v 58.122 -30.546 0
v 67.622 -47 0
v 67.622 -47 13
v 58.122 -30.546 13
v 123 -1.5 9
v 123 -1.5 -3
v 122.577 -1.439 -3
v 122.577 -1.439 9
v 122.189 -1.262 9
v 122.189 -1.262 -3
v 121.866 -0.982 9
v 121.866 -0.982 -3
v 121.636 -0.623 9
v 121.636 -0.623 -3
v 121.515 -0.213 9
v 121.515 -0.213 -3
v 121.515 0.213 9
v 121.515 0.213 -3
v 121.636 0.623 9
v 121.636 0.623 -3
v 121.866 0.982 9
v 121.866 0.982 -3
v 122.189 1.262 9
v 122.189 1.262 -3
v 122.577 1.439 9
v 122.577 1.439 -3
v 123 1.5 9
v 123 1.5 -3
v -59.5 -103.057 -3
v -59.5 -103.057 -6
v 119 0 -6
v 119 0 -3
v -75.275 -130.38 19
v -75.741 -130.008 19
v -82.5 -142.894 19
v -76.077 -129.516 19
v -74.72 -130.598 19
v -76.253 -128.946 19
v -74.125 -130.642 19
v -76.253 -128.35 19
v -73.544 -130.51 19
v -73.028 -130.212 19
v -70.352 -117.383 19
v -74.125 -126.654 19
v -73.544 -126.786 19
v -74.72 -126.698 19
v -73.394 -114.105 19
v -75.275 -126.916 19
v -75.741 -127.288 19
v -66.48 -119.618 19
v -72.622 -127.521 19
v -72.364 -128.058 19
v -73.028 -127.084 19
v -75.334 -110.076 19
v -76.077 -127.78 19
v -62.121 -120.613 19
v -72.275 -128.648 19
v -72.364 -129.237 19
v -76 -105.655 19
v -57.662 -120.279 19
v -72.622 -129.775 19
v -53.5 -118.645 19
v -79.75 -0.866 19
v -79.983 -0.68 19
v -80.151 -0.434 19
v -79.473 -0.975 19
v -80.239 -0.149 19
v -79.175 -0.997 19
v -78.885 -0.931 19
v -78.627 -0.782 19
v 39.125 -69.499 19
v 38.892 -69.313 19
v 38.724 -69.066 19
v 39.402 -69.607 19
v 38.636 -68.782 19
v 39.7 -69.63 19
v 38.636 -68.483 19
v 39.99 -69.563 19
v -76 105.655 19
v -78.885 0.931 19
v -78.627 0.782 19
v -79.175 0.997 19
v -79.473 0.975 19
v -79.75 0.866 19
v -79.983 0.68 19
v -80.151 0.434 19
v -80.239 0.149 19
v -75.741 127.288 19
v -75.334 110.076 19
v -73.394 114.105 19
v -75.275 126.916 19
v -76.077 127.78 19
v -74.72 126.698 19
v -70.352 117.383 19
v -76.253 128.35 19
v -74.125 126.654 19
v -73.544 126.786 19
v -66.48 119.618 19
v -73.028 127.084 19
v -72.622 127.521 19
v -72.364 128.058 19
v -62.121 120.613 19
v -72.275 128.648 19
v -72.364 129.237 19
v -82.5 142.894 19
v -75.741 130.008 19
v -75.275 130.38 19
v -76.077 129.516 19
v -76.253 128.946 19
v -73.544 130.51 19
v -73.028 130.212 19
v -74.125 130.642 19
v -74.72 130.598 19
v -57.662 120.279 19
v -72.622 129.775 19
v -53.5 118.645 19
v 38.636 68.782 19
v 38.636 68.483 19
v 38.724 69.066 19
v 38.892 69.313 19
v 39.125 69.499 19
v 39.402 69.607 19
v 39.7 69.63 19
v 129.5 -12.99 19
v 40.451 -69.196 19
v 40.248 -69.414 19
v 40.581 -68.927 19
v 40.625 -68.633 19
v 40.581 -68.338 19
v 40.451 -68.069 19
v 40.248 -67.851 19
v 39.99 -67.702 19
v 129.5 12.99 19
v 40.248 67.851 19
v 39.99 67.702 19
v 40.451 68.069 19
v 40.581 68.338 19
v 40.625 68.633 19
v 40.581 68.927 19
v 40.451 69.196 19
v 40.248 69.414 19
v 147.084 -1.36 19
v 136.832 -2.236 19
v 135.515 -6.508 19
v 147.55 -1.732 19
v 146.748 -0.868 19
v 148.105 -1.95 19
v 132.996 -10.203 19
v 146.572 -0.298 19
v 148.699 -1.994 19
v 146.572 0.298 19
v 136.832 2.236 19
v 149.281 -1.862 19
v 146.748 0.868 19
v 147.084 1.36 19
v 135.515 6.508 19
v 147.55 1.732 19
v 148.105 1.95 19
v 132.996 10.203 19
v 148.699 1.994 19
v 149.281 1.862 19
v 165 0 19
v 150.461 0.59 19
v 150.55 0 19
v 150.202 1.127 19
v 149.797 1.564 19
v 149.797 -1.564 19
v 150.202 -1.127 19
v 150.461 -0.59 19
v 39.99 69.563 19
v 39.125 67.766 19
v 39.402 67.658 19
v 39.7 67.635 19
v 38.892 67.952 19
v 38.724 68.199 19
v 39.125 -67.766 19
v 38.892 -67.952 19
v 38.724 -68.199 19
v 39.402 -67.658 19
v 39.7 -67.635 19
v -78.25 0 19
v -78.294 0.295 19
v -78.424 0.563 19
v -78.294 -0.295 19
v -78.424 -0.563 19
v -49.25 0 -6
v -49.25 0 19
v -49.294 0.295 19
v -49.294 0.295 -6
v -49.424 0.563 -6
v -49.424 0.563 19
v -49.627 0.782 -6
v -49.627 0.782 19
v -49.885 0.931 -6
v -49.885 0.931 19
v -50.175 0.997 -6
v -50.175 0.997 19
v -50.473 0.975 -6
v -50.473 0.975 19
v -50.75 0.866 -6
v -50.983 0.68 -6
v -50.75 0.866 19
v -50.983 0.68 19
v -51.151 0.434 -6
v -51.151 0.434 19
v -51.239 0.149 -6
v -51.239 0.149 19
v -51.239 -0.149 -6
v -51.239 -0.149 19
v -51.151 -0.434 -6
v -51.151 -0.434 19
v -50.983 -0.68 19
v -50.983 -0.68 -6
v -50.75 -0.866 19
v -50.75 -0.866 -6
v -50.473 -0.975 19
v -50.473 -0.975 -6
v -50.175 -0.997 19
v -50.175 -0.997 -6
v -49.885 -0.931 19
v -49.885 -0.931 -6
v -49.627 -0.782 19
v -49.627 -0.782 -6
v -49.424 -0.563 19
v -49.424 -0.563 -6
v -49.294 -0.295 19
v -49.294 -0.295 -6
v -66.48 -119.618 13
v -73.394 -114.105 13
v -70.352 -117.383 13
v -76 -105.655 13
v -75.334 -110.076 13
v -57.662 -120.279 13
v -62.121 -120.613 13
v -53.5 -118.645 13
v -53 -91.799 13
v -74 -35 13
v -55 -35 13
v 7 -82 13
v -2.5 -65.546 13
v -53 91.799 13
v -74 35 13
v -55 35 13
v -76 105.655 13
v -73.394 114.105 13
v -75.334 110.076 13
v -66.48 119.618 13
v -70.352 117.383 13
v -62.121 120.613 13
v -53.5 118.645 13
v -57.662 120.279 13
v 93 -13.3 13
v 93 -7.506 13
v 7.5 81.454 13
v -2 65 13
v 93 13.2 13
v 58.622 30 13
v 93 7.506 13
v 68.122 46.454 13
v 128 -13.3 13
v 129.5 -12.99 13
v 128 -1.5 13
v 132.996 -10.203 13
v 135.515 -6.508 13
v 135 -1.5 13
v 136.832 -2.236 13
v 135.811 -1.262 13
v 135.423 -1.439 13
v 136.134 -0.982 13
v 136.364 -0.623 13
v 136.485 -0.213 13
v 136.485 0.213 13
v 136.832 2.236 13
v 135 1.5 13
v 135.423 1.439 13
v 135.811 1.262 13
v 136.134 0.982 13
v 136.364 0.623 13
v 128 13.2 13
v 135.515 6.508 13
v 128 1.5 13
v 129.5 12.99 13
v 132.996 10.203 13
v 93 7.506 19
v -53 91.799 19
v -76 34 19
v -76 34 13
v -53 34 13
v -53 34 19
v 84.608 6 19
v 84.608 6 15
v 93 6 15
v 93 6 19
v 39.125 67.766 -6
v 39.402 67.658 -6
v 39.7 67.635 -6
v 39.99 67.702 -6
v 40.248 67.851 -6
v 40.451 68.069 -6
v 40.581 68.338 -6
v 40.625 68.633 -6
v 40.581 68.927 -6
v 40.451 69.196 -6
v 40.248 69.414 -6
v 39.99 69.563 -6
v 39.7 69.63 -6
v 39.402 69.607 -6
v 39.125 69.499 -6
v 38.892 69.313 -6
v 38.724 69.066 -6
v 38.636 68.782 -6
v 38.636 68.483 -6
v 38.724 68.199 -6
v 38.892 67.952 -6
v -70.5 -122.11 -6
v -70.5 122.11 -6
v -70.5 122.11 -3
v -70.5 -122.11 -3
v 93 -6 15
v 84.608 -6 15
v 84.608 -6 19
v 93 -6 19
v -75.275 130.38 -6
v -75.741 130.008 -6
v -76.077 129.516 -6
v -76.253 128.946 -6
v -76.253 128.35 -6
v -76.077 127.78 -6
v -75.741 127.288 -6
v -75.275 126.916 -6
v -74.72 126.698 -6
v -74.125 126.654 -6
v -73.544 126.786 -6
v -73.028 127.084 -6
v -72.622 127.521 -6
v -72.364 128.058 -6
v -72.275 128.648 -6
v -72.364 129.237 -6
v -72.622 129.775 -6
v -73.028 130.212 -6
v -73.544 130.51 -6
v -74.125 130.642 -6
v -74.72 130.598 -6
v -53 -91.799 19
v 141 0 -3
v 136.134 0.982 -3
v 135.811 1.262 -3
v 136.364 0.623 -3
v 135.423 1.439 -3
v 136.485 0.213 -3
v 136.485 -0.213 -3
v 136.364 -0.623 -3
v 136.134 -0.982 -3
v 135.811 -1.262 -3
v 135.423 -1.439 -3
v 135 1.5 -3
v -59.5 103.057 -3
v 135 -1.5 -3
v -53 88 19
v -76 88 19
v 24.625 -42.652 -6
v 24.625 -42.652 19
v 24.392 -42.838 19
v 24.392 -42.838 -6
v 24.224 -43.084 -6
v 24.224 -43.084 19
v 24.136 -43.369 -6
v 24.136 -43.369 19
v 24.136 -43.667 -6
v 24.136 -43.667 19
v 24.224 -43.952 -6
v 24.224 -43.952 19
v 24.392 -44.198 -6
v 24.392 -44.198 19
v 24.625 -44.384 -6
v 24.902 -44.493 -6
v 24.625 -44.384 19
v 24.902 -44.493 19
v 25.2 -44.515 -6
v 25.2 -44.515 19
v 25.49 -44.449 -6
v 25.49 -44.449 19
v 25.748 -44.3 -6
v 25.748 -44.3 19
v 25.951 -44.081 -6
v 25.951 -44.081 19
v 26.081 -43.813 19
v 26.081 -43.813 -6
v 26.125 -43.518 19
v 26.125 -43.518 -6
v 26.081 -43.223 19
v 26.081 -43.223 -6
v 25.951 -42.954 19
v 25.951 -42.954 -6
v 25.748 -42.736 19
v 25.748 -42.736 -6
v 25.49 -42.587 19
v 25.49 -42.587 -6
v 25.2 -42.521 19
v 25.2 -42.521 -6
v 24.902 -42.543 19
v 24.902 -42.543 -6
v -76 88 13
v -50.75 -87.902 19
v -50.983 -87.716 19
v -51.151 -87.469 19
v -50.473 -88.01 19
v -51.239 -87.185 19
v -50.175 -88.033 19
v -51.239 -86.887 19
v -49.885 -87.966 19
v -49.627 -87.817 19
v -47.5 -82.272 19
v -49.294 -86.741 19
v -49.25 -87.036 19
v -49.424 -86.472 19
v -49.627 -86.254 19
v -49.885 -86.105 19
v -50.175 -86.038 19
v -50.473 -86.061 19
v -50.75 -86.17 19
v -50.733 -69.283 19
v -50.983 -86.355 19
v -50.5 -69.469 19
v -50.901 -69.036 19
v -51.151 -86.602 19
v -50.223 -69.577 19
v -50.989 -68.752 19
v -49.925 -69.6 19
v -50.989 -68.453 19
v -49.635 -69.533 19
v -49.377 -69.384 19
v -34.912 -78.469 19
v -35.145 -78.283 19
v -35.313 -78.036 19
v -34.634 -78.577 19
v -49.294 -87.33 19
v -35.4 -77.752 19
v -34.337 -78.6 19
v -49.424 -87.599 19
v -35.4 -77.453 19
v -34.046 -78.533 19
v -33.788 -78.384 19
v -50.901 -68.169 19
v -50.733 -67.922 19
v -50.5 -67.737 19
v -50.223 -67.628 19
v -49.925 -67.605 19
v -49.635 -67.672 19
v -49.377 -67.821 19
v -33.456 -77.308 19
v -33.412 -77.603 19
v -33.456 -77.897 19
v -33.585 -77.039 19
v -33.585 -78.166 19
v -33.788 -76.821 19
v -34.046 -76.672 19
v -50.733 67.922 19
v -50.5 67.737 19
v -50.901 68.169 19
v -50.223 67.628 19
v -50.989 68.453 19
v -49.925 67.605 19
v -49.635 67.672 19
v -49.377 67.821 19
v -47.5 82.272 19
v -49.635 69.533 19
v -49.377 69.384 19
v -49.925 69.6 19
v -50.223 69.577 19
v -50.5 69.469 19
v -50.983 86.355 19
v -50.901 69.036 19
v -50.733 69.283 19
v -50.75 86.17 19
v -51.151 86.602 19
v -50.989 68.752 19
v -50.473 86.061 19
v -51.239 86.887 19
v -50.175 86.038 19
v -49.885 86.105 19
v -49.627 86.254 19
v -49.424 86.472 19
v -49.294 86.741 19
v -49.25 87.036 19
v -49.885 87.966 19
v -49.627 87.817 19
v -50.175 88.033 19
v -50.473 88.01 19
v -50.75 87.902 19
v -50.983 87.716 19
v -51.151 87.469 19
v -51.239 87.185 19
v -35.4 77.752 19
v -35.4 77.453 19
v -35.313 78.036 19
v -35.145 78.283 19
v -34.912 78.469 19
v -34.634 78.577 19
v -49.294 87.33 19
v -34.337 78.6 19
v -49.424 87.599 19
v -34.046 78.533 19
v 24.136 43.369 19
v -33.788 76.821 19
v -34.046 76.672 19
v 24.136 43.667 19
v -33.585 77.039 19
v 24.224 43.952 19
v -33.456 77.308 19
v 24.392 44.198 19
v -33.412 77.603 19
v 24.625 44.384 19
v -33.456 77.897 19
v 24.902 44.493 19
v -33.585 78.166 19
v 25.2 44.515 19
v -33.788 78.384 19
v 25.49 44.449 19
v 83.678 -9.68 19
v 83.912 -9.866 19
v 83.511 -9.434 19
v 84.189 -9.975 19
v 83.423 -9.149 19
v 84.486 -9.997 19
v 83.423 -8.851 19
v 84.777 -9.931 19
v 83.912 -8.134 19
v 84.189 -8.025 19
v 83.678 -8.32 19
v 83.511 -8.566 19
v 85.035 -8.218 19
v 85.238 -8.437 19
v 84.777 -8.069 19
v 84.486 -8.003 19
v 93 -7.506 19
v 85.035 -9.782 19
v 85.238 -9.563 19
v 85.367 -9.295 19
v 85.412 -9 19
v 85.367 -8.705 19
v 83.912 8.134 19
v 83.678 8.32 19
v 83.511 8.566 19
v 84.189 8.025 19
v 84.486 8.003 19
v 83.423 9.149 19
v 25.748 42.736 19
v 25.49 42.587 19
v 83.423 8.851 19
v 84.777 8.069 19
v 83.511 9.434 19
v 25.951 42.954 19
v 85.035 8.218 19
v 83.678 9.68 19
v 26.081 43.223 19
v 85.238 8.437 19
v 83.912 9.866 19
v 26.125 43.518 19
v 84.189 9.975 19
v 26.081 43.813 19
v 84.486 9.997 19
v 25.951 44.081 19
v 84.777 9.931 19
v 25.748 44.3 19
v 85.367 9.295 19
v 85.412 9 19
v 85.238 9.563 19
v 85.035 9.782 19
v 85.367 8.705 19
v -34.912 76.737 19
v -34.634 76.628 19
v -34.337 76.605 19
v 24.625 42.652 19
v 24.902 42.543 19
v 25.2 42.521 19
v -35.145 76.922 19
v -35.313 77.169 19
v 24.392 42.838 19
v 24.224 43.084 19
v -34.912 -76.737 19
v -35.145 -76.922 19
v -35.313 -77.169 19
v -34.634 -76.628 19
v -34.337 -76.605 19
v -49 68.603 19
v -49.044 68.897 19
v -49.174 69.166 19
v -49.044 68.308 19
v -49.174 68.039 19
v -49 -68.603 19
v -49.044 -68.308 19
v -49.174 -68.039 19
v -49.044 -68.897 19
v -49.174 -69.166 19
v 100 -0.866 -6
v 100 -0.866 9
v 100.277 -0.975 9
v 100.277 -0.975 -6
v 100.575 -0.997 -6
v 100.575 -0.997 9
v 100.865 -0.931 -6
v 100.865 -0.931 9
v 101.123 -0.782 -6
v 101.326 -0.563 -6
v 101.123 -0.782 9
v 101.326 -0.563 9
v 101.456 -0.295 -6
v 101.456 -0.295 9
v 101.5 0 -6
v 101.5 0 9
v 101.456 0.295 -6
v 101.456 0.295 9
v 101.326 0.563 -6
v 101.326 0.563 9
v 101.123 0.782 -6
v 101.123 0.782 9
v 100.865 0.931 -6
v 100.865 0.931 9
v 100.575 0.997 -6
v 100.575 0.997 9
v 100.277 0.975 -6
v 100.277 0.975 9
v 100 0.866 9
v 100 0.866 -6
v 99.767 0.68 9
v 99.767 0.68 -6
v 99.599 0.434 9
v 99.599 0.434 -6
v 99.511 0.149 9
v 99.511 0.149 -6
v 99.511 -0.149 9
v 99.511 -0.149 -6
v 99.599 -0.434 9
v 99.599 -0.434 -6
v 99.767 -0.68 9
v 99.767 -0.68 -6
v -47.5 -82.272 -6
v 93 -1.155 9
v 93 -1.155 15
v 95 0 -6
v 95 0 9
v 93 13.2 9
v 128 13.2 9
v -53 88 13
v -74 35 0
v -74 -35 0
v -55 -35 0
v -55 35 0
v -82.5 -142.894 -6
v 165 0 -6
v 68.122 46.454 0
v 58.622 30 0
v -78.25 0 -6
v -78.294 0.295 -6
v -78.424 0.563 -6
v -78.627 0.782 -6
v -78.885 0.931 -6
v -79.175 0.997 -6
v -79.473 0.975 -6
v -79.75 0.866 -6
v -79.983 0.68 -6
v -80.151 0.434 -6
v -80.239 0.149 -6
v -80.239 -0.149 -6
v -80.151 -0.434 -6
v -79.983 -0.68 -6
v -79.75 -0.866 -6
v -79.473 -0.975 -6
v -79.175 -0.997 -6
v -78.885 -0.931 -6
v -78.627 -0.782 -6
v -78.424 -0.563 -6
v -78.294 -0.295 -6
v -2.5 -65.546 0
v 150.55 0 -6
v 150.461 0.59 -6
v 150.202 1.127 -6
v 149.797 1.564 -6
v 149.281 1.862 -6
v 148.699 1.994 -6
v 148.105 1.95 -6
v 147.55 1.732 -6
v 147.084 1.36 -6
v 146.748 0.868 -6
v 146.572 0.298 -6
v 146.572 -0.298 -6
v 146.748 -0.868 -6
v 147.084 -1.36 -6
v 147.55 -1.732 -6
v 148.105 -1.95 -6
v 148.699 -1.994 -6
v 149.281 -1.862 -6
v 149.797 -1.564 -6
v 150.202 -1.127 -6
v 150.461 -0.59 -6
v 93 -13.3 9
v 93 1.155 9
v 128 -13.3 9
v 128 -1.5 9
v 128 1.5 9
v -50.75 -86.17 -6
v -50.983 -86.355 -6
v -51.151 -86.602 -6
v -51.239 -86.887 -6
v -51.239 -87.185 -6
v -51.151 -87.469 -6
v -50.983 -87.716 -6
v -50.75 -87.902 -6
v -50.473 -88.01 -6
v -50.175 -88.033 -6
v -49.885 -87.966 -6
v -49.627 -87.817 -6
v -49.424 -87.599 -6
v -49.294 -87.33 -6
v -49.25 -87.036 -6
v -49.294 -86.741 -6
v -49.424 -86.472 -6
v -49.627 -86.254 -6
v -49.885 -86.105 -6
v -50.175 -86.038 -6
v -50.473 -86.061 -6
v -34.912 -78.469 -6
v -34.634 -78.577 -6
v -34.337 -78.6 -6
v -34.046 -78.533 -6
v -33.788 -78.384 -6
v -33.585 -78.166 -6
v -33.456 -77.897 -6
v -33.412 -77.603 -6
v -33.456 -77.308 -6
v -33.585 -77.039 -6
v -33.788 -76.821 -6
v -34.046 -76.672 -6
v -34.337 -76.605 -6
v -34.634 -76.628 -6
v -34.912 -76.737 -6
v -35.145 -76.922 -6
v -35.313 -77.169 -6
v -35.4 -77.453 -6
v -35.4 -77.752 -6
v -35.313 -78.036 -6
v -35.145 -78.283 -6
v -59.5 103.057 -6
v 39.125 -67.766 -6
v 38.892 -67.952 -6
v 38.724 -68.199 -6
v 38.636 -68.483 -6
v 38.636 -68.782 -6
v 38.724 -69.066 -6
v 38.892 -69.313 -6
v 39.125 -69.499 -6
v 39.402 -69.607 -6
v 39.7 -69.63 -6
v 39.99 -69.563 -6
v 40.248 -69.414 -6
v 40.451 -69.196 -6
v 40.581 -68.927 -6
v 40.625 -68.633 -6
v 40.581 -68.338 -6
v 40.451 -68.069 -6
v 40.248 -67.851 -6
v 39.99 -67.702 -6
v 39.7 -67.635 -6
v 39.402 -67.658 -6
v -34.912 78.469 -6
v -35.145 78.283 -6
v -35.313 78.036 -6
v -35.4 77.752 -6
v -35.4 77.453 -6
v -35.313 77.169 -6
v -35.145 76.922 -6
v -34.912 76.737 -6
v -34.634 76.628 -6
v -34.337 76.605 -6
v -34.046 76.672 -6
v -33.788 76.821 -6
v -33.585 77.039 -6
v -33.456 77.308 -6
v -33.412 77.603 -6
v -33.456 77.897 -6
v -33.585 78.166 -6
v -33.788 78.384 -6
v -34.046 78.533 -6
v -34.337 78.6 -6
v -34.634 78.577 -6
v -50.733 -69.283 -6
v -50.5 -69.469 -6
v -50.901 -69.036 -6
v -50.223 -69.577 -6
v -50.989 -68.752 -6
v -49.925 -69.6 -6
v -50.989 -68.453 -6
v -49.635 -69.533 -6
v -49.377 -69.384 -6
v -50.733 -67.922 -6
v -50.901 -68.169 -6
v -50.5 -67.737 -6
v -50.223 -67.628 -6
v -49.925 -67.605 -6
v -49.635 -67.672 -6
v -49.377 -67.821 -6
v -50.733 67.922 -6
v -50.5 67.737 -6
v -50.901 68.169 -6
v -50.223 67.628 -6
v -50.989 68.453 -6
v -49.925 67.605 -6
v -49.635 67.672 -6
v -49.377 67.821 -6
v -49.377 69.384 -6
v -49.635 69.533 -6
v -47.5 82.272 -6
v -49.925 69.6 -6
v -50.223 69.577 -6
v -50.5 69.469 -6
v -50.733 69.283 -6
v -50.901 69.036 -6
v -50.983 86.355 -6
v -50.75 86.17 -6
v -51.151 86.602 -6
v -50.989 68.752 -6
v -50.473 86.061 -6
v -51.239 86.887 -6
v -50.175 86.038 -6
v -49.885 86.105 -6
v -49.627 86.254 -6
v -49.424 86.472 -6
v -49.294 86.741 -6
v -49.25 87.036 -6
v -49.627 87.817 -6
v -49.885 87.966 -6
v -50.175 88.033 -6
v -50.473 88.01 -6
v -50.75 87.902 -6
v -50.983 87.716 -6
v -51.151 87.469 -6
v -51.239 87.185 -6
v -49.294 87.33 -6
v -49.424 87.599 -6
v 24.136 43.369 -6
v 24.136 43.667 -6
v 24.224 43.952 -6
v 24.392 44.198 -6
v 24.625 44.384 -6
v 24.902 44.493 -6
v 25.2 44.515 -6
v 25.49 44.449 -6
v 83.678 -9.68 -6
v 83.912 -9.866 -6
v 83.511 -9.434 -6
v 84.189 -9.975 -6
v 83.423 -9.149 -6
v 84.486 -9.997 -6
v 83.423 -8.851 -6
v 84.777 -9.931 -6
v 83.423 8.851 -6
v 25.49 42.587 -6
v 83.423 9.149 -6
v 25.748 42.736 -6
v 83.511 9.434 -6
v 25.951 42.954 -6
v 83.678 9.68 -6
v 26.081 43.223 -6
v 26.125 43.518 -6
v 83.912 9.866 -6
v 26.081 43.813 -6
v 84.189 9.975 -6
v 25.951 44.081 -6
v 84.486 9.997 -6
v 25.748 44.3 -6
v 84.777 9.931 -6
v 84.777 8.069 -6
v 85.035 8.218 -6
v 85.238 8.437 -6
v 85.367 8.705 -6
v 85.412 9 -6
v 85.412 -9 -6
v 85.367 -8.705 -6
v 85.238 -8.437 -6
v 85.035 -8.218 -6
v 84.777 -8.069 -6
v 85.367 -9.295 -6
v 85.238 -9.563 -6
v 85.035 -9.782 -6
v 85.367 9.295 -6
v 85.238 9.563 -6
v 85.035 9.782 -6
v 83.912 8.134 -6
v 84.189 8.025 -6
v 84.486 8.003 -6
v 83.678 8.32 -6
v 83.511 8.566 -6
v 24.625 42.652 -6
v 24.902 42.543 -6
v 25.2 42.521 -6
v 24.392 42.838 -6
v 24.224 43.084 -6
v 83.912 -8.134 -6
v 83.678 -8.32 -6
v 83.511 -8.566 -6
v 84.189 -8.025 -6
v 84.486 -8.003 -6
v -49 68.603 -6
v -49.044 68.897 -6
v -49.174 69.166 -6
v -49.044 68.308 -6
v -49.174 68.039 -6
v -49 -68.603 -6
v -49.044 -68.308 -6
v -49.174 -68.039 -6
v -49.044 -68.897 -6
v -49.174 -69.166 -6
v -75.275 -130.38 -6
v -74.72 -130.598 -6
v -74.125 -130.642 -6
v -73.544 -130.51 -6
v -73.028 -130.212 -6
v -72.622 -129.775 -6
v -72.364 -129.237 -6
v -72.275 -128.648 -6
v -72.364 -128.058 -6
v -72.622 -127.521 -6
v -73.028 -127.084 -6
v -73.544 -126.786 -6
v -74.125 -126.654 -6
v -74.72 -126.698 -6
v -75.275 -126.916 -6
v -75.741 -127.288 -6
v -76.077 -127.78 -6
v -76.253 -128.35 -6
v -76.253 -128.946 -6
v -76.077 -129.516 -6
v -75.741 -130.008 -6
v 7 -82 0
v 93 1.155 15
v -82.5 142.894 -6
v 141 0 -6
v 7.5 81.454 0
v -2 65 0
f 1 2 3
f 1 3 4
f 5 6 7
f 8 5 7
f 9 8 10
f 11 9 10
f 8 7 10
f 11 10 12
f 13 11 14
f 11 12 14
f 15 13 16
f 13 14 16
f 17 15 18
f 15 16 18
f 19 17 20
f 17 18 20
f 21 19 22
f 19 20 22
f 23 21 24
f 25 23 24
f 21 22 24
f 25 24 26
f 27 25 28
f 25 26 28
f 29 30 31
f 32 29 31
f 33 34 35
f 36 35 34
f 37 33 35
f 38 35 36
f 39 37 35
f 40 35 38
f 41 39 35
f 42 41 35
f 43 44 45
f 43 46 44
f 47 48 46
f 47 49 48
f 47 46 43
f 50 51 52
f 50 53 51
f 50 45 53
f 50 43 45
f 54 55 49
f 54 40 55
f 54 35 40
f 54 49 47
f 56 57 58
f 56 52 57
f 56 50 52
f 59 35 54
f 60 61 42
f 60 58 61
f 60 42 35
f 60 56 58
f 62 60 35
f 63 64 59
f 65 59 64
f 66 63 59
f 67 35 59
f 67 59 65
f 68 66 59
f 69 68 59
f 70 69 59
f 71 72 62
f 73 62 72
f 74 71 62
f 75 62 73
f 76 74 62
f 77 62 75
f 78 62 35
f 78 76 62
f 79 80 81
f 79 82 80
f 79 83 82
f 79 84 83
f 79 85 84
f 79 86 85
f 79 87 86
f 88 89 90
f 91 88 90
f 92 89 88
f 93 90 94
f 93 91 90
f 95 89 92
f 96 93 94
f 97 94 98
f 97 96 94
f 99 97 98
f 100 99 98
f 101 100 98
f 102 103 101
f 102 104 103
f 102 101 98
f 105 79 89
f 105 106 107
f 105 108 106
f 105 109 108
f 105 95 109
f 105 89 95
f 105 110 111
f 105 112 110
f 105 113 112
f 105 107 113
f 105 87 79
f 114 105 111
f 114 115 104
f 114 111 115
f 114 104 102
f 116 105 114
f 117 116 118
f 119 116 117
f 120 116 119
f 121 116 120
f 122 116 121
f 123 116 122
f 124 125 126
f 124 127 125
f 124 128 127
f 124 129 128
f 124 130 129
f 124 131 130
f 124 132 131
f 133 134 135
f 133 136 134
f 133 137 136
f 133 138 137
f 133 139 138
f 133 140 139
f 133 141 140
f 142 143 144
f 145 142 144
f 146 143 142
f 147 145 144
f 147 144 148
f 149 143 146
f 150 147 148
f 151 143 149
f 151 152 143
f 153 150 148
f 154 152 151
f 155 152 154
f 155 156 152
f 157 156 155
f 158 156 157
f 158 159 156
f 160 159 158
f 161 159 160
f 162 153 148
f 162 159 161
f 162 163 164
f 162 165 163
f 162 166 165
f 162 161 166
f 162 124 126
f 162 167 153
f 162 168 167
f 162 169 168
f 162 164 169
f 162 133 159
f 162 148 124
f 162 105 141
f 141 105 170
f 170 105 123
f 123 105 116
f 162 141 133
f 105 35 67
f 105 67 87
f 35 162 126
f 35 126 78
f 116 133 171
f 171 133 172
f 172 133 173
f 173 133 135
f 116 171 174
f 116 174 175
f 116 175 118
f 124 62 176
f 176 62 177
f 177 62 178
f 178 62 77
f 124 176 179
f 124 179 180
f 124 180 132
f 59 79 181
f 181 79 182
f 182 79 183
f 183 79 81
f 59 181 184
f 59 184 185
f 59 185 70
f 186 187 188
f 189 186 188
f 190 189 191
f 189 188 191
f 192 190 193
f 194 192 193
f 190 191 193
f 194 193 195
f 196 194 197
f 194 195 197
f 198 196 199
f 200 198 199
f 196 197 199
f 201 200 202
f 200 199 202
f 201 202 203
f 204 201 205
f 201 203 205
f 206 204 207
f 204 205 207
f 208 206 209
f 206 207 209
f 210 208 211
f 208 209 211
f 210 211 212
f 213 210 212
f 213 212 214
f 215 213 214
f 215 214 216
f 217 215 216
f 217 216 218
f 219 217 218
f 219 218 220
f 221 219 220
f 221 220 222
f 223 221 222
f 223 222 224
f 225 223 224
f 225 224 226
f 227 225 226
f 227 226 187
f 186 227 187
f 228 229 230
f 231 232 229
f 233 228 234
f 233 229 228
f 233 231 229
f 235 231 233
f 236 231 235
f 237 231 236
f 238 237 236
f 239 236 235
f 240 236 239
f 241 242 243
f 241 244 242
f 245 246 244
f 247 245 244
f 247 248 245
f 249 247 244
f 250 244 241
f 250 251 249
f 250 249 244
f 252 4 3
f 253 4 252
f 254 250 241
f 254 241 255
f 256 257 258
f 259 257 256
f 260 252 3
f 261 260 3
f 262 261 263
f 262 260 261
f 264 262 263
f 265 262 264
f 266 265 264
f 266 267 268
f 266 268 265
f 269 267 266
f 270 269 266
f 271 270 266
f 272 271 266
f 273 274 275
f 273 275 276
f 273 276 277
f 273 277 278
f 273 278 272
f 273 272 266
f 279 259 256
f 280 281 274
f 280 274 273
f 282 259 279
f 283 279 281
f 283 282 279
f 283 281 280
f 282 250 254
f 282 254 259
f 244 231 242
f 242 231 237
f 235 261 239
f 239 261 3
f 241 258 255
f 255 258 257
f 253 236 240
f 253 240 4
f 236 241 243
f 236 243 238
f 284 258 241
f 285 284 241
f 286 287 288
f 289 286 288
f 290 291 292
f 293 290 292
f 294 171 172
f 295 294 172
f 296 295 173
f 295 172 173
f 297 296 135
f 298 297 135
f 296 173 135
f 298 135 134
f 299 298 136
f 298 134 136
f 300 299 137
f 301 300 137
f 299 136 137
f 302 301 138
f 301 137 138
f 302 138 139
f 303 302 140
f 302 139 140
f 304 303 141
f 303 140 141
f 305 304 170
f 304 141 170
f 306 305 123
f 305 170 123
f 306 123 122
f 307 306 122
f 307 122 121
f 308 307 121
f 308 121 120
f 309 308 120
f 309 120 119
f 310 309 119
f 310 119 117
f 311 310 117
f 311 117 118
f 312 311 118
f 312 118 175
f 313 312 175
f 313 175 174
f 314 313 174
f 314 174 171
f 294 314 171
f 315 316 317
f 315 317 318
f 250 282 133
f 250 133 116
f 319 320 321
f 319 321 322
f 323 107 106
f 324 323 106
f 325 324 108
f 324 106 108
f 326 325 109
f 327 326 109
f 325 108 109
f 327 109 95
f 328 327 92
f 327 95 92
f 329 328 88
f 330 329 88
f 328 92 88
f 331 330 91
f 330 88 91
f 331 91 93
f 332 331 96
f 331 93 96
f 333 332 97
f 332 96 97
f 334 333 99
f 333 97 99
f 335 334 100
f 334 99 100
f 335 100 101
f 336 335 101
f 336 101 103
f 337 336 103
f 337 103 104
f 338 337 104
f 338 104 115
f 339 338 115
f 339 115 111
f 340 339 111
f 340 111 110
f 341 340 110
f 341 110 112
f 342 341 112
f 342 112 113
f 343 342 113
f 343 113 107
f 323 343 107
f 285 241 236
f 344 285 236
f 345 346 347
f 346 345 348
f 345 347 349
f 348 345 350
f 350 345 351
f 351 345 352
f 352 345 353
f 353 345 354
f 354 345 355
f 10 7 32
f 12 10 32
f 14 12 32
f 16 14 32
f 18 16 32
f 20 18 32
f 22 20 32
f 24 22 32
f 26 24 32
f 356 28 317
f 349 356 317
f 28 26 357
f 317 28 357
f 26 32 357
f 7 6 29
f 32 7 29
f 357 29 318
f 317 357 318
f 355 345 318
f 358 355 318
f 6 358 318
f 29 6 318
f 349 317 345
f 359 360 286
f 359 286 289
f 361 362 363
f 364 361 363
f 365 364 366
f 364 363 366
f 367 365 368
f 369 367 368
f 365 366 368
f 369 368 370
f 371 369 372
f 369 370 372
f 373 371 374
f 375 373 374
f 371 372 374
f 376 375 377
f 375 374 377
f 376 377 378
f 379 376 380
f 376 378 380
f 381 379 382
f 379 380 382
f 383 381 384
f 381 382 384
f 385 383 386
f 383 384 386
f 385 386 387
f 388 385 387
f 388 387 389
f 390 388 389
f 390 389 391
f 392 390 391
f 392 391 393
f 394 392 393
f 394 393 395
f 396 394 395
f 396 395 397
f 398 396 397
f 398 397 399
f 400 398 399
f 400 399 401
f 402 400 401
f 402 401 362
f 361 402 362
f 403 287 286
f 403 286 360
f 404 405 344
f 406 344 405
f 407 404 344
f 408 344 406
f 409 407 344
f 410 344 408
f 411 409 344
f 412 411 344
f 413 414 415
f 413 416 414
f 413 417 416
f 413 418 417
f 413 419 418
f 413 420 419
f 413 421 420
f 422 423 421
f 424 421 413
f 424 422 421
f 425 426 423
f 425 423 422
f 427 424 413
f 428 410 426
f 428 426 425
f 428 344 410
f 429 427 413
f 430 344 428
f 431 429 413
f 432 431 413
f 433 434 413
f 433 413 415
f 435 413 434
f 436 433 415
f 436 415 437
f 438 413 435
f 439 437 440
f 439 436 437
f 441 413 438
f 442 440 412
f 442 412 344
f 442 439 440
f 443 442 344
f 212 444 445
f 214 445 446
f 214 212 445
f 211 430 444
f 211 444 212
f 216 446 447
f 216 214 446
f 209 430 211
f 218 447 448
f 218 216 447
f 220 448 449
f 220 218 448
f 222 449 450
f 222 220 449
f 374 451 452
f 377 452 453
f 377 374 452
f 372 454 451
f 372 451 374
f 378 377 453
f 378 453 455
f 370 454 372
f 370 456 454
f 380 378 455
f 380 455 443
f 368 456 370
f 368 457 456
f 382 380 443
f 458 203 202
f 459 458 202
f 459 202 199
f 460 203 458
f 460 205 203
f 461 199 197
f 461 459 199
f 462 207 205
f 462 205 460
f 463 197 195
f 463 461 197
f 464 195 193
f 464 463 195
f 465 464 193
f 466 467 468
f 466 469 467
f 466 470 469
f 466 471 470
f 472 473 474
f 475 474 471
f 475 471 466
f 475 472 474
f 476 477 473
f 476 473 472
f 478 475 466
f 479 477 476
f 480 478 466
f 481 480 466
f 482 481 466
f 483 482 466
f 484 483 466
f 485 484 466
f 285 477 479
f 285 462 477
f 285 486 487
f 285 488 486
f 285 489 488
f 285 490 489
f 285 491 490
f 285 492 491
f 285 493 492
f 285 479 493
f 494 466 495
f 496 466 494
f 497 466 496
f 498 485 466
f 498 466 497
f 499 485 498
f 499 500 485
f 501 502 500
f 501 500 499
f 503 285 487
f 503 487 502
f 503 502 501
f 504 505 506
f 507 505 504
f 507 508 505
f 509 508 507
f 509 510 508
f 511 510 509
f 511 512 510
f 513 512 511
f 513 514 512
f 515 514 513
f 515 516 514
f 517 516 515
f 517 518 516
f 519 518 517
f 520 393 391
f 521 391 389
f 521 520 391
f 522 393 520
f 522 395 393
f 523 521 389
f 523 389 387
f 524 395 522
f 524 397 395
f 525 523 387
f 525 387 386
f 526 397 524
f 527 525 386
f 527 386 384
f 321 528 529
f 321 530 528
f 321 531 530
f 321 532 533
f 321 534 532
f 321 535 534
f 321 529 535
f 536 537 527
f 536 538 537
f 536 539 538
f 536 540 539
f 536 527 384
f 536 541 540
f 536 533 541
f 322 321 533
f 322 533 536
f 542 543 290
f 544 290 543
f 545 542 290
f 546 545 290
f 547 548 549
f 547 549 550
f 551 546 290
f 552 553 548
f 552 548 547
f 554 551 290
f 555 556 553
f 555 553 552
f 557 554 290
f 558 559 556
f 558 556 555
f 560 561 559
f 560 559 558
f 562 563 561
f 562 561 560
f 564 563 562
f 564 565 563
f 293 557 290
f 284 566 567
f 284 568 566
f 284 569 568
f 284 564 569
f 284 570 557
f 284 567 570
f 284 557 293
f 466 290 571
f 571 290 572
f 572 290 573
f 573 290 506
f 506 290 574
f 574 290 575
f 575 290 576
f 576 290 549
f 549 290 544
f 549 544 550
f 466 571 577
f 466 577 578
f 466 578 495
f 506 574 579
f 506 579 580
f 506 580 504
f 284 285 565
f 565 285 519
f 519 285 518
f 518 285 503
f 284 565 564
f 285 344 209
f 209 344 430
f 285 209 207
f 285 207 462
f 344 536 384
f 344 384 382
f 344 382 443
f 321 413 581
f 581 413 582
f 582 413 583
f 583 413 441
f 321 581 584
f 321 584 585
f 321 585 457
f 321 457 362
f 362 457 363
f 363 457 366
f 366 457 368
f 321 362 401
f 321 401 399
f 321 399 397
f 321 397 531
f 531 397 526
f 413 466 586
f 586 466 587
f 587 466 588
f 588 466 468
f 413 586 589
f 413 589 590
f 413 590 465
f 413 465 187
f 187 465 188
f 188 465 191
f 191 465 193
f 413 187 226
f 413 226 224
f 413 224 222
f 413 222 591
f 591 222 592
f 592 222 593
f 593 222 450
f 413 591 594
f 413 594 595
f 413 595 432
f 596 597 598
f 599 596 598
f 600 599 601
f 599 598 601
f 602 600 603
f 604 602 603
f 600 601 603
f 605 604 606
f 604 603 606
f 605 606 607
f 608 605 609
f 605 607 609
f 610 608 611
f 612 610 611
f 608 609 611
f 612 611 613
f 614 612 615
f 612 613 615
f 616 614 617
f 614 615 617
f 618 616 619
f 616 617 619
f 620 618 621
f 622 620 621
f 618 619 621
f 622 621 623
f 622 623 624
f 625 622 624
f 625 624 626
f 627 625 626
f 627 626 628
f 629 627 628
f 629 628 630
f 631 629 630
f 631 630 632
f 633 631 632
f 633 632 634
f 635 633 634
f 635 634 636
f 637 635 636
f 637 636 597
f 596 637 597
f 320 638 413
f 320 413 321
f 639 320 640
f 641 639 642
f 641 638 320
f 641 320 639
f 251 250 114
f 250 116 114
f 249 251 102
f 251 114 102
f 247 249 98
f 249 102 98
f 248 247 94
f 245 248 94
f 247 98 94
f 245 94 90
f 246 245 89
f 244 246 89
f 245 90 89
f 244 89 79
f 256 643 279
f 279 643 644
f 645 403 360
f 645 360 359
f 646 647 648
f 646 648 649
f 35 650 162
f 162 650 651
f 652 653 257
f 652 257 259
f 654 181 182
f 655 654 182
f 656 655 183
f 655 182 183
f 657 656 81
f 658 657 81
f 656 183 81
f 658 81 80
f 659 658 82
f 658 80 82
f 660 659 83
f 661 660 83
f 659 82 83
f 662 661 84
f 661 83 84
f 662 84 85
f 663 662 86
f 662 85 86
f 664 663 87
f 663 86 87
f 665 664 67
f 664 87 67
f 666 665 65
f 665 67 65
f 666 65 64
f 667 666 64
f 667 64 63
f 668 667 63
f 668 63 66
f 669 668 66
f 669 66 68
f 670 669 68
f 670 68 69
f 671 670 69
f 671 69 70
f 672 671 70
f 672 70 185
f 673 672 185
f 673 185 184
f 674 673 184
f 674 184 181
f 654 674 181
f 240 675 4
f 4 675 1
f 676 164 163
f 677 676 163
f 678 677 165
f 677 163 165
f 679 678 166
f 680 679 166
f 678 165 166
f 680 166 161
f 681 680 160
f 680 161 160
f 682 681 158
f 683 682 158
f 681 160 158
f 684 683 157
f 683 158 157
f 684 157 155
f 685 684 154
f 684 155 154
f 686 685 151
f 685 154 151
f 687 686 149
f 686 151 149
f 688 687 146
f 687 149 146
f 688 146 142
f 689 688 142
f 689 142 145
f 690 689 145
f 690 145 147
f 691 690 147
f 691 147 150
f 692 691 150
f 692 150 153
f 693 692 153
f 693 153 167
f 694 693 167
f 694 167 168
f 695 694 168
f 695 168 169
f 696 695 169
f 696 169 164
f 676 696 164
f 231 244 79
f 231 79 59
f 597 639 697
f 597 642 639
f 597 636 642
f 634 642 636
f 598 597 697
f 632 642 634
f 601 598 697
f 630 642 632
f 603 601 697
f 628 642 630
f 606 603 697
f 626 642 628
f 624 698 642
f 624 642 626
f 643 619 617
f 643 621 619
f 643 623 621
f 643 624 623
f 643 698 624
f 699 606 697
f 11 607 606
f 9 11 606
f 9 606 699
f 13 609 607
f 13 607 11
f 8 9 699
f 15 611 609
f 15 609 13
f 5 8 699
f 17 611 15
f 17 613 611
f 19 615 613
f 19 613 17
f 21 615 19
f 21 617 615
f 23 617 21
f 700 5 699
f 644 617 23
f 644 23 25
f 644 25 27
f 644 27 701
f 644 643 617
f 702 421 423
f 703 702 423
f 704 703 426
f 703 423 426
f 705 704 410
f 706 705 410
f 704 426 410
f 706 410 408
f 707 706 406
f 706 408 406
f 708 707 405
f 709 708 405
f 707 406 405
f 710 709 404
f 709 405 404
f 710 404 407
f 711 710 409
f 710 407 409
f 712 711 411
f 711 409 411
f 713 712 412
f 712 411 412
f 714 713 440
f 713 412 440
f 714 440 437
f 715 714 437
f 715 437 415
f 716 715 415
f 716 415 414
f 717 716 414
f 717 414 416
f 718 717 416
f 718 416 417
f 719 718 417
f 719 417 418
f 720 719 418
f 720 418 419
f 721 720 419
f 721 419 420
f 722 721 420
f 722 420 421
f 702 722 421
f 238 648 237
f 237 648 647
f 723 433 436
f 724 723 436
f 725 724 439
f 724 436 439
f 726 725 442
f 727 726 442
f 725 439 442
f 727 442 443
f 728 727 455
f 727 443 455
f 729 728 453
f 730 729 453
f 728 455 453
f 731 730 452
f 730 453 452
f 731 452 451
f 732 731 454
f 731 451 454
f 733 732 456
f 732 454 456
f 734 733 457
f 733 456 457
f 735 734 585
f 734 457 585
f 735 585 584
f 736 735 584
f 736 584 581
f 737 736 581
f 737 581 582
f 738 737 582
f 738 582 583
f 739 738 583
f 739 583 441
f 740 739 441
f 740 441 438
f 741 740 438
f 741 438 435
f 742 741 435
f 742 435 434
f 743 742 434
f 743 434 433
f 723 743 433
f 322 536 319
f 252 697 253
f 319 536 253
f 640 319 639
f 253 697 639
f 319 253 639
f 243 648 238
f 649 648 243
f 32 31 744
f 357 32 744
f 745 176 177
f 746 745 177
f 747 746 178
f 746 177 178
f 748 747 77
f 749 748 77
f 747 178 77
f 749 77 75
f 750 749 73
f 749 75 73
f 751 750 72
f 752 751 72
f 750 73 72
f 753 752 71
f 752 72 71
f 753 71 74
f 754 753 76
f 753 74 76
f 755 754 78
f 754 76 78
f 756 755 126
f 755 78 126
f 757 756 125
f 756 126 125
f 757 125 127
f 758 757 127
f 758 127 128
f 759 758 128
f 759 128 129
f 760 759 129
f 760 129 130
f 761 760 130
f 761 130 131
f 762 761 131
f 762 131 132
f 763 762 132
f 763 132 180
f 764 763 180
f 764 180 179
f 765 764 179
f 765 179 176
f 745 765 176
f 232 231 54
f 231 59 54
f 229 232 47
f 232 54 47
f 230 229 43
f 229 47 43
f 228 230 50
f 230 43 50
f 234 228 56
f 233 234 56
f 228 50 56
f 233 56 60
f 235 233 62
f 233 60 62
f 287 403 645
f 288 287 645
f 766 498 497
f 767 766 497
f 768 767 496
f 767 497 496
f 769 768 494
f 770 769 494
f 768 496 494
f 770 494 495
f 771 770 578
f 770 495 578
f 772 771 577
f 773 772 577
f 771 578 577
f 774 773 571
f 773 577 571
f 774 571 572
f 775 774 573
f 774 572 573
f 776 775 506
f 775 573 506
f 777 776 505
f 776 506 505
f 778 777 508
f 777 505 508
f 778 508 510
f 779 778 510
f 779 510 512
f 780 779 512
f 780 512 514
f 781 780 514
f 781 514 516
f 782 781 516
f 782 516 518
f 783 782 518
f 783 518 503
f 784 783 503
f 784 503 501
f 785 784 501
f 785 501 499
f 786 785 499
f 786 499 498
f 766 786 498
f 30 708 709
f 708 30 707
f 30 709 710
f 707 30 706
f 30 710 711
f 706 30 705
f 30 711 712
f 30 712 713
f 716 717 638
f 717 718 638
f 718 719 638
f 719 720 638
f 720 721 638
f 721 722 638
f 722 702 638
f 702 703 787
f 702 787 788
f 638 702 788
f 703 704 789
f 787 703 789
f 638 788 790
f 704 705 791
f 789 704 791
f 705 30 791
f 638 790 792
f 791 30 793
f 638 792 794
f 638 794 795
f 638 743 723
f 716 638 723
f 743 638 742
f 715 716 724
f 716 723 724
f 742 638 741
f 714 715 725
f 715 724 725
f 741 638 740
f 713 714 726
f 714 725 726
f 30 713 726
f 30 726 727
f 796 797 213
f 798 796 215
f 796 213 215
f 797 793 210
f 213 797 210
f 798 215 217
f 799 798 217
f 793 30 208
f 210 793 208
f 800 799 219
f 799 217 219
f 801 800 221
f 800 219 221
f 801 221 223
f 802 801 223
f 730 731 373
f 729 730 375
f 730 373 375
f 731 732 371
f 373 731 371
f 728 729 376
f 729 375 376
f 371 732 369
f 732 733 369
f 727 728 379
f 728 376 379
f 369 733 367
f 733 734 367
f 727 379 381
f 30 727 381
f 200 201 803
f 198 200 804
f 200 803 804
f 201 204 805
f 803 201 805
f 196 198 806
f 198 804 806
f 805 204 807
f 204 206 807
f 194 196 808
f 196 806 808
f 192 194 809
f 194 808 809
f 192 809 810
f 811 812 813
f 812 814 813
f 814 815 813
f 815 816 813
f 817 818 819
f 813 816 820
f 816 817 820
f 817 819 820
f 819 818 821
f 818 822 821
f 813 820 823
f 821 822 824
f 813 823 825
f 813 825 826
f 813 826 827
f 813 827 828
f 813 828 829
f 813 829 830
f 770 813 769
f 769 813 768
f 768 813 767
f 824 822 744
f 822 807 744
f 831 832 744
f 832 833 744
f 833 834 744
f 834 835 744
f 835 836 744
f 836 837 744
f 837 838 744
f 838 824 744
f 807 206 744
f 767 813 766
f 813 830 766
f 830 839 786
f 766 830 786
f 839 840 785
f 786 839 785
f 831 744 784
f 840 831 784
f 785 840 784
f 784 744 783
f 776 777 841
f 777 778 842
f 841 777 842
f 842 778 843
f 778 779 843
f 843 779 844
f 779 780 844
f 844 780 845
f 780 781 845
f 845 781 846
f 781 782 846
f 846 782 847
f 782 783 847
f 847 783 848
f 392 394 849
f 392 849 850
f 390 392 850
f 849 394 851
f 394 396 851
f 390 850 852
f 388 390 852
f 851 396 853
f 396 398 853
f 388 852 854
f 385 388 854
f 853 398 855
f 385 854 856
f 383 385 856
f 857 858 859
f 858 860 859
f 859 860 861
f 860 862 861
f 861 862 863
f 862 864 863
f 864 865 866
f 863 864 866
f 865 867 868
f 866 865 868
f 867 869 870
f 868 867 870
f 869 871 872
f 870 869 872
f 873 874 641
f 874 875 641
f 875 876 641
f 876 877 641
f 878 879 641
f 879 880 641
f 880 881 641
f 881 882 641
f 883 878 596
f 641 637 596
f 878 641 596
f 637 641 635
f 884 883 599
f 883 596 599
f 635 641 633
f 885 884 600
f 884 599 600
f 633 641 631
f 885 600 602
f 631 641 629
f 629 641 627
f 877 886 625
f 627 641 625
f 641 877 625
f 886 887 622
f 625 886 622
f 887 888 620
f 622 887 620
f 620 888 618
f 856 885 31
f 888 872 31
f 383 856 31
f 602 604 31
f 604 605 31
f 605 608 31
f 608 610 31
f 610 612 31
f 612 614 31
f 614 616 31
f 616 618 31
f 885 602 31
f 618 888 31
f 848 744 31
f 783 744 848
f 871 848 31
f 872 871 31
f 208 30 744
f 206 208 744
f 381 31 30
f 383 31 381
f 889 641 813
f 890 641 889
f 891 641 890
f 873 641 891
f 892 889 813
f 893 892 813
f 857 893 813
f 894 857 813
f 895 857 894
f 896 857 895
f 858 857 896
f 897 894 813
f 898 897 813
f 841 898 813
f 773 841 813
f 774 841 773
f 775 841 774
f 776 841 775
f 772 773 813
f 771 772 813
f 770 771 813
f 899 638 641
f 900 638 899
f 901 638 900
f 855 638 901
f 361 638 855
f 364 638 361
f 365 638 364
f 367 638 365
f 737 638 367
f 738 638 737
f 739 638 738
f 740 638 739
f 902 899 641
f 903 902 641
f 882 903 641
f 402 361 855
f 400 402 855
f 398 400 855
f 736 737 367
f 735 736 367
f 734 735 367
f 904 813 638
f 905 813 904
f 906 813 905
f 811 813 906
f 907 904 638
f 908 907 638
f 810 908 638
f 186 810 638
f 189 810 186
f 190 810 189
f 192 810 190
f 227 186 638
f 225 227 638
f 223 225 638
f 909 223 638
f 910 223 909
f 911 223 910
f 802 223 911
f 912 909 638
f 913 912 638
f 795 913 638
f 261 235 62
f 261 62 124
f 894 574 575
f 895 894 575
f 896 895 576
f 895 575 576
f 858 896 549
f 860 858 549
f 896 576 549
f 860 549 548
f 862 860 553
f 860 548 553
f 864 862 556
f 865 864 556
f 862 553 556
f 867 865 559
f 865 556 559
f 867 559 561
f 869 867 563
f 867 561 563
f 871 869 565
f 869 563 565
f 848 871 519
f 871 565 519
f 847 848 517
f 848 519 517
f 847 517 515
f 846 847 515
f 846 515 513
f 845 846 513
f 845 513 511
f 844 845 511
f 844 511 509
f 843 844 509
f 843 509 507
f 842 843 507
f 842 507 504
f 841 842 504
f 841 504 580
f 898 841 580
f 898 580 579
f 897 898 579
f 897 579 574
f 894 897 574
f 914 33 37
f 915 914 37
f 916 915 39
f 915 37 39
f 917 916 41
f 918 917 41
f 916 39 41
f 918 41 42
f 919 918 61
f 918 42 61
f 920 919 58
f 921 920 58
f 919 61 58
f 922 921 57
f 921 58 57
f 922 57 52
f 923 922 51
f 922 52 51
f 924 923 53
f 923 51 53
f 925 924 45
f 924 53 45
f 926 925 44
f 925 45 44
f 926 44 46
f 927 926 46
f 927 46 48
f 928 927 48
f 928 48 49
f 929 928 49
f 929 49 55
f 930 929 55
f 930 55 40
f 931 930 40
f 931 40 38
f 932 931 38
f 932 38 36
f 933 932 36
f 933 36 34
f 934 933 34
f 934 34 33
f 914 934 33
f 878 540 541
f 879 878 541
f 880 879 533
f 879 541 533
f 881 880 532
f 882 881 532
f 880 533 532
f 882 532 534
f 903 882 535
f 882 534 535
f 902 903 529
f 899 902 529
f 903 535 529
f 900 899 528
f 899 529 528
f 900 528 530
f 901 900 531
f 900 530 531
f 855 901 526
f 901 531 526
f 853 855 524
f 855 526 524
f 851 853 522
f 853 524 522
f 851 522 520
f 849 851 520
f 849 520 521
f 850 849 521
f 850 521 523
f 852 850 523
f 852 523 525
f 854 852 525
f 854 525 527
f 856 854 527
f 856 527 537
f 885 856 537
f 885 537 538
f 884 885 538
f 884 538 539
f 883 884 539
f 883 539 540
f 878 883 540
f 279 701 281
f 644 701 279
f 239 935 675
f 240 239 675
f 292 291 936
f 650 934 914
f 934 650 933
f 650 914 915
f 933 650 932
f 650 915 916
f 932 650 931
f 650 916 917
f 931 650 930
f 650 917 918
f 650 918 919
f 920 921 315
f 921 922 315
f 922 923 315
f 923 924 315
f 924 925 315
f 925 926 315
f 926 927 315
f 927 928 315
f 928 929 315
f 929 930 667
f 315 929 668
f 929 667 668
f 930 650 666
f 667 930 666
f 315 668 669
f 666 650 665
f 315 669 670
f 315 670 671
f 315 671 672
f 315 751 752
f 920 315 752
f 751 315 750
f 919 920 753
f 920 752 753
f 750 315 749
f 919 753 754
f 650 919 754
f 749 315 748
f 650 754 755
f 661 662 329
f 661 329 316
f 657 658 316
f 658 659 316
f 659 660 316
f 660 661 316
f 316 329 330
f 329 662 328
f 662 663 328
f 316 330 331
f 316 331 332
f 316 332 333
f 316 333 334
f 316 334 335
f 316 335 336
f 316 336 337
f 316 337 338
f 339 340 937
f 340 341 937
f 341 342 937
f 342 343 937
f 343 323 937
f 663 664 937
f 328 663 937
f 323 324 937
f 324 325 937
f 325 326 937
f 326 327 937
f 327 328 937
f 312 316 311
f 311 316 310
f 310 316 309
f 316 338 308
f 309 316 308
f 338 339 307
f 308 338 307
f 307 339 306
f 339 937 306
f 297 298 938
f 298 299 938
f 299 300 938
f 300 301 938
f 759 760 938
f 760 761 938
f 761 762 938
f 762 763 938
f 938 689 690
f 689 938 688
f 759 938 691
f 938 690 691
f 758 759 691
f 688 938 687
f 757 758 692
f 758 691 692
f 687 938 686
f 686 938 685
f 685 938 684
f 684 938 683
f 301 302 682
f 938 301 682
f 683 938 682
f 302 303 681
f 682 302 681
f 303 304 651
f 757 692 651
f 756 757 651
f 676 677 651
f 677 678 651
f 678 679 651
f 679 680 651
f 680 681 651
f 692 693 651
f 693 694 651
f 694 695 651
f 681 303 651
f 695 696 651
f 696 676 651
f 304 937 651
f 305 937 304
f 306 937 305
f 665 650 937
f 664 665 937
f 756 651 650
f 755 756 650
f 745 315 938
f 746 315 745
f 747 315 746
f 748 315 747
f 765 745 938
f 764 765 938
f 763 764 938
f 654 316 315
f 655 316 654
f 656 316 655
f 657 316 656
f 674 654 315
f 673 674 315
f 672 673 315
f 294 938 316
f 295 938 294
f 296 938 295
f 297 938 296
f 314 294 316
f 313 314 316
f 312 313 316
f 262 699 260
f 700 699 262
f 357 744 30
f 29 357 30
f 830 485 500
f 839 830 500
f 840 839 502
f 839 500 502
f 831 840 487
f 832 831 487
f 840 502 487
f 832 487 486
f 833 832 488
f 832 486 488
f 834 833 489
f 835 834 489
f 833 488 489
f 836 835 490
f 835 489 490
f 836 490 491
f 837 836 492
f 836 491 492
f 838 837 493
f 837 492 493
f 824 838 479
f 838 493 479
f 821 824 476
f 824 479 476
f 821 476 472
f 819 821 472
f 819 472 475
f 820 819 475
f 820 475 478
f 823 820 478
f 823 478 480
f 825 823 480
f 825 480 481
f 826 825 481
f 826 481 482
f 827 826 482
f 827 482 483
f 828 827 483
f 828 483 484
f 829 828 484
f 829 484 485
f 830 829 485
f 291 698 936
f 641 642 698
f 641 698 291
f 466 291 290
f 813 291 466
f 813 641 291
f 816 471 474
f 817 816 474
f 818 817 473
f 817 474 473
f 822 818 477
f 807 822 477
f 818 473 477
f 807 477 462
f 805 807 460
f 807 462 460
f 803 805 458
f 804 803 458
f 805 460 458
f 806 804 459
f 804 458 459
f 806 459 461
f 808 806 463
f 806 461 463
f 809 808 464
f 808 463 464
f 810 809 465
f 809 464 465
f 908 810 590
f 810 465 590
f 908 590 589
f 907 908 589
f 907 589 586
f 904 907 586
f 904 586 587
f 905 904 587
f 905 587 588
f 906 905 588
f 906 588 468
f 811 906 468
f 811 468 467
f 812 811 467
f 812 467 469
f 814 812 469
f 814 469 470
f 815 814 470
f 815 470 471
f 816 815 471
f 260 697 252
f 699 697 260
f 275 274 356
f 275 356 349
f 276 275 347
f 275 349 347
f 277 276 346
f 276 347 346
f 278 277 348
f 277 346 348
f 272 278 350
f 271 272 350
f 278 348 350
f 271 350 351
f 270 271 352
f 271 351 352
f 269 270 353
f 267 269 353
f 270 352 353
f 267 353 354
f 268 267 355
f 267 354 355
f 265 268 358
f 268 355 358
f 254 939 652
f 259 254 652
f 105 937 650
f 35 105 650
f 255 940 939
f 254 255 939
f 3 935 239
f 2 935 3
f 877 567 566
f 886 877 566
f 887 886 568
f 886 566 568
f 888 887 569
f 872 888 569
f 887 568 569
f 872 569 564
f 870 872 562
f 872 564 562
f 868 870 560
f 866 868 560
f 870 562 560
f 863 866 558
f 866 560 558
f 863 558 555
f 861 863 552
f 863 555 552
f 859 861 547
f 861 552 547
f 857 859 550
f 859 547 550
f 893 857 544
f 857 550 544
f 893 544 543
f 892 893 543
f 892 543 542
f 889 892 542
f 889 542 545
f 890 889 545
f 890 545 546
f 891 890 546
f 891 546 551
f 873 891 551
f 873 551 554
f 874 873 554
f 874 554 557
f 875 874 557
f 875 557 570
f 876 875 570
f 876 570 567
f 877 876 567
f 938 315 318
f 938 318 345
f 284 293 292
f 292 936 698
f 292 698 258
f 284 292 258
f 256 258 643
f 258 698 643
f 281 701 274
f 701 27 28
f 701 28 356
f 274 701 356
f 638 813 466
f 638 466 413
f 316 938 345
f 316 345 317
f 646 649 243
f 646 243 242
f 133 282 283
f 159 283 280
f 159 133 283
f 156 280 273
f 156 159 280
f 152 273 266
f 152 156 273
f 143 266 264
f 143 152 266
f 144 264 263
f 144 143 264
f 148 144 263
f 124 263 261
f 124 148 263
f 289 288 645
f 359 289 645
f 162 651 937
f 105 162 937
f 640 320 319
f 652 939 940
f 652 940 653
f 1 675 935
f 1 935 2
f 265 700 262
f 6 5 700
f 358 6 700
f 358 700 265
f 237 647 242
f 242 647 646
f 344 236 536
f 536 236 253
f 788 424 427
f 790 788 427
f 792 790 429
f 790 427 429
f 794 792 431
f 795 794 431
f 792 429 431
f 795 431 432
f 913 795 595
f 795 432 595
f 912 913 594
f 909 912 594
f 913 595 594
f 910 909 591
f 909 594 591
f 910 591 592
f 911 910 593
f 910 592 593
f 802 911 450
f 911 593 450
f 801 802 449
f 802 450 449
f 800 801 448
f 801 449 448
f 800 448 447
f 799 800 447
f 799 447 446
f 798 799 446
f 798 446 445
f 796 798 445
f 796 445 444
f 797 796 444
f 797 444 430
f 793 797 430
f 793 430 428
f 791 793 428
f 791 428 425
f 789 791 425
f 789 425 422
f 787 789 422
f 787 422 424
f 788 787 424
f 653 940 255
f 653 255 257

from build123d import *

# Parameters (mm, degrees)
BOX005_W               = 23
BOX005_H               = 54
BOX005_DEPTH           = 6
PRISM003_DEPTH         = 6
PRISM002_DEPTH         = 6
BOX004_W               = 10
BOX004_H               = 12
BOX004_DEPTH           = 4
BOX003_W               = 35
BOX003_H               = 26.5
BOX003_DEPTH           = 10
BOX002_W               = 70
BOX002_H               = 19
BOX002_DEPTH           = 19
BOX002_PLACEMENT_ANGLE = 30
BOX001_W               = 70
BOX001_H               = 19
BOX001_DEPTH           = 19
BOX001_PLACEMENT_ANGLE = 90
BOX_W                  = 70
BOX_H                  = 19
BOX_DEPTH              = 19
BOX_PLACEMENT_ANGLE    = 30
PRISM001_DEPTH         = 25
PRISM_DEPTH            = 25
FILLET_R               = 15
SKETCH001_R            = 2
POCKET_DEPTH           = 782.777352
POLARPATTERN_COUNT     = 3
POCKET001_DEPTH        = 3
SKETCH002_R            = 1
POCKET002_DEPTH        = 782.777352
POLARPATTERN001_COUNT  = 3
SKETCH004_R            = 1
POCKET003_DEPTH        = 782.777352
POLARPATTERN002_COUNT  = 3
POLARPATTERN003_COUNT  = 3
SKETCH005_R            = 1
POCKET004_DEPTH        = 782.777352
POLARPATTERN004_COUNT  = 3
POCKET005_DEPTH        = 22.001


with BuildPart() as box005:
    # Box005 → Box005 (new body)
    with BuildSketch(Plane(origin=(-76, 34, 13), x_dir=(1, 0, 0), z_dir=(0, 0, 1))):
        with Locations((11.5, 27)):
            Rectangle(BOX005_W, BOX005_H)
    extrude(amount=BOX005_DEPTH)


with BuildPart() as prism003:
    # Prism003 → Prism003 (new body)
    with BuildSketch(Plane.XY.offset(13)):
        Polygon((106, 0), (-53, 91.798693), (-53, -91.798693), align=None)
    extrude(amount=PRISM003_DEPTH)


with BuildPart() as cut006:
    # Prism002 → Prism002 (new body)
    with BuildSketch(Plane.XY.offset(13)):
        Polygon((152, 0), (-76, 131.635861), (-76, -131.635861), align=None)
    extrude(amount=PRISM002_DEPTH)

    # Cut006: cut Prism003
    add(prism003.part, mode=Mode.SUBTRACT)


with BuildPart() as box004:
    # Box004 → Box004 (new body)
    with BuildSketch(Plane(origin=(84, -6, 15), x_dir=(1, 0, 0), z_dir=(0, 0, 1))):
        with Locations((5, 6)):
            Rectangle(BOX004_W, BOX004_H)
    extrude(amount=BOX004_DEPTH)


with BuildPart() as box003:
    # Box003 → Box003 (new body)
    with BuildSketch(Plane(origin=(93, -13.3, 9), x_dir=(1, 0, 0), z_dir=(0, 0, 1))):
        with Locations((17.5, 13.25)):
            Rectangle(BOX003_W, BOX003_H)
    extrude(amount=BOX003_DEPTH)


with BuildPart() as box002:
    # Box002 → Box002 (new body)
    with BuildSketch(Plane.XY):
        with Locations((35, 9.5)):
            Rectangle(BOX002_W, BOX002_H)
    extrude(amount=BOX002_DEPTH)


with BuildPart() as box002_1:
    # Box002 placement: moved
    add(box002.part.moved(Location((7, -82, 0))).rotate(Axis((7, -82, 0), (0, 0, 1)), BOX002_PLACEMENT_ANGLE))


with BuildPart() as box001:
    # Box001 → Box001 (new body)
    with BuildSketch(Plane.XY):
        with Locations((35, 9.5)):
            Rectangle(BOX001_W, BOX001_H)
    extrude(amount=BOX001_DEPTH)


with BuildPart() as box001_1:
    # Box001 placement: moved
    add(box001.part.moved(Location((-55, -35, 0))).rotate(Axis((-55, -35, 0), (0, 0, 1)), BOX001_PLACEMENT_ANGLE))


with BuildPart() as box:
    # Box → Box (new body)
    with BuildSketch(Plane.XY):
        with Locations((35, 9.5)):
            Rectangle(BOX_W, BOX_H)
    extrude(amount=BOX_DEPTH)


with BuildPart() as box_1:
    # Box placement: moved
    add(box.part.moved(Location((-2, 65, 0))).rotate(Axis((-2, 65, 0), (0, 0, -1)), BOX_PLACEMENT_ANGLE))


with BuildPart() as prism001:
    # Prism001 → Prism001 (new body)
    with BuildSketch(Plane.XY.offset(-6)):
        Polygon((95, 0), (-47.5, 82.272413), (-47.5, -82.272413), align=None)
    extrude(amount=PRISM001_DEPTH)


with BuildPart() as body:
    # Prism → Prism (new body)
    with BuildSketch(Plane.XY.offset(-6)):
        Polygon((165, 0), (-82.5, 142.894192), (-82.5, -142.894192), align=None)
    extrude(amount=PRISM_DEPTH)

    # Cut: cut Prism001
    add(prism001.part, mode=Mode.SUBTRACT)

    # Cut001: cut Box
    add(box_1.part, mode=Mode.SUBTRACT)

    # Cut002: cut Box001
    add(box001_1.part, mode=Mode.SUBTRACT)

    # Cut003: cut Box002
    add(box002_1.part, mode=Mode.SUBTRACT)

    # Cut004: cut Box003
    add(box003.part, mode=Mode.SUBTRACT)

    # Cut005: cut Box004
    add(box004.part, mode=Mode.SUBTRACT)

    # Cut007: cut Cut006
    add(cut006.part, mode=Mode.SUBTRACT)

    # Fillet
    fillet_edges = [body.edges().sort_by_distance(p)[0] for p in [
        (152, 0, 16),
        (-76, 131.635861, 16),
        (-76, -131.635861, 16),
    ]]
    fillet(fillet_edges, radius=FILLET_R)

    # Sketch001 (on Face1 of BaseFeature) → Pocket (cut, through all)
    with BuildSketch(Plane.XY.offset(19)):
        with Locations((148.549835, 0)):
            Circle(SKETCH001_R)
    pocket = extrude(amount=-POCKET_DEPTH, mode=Mode.SUBTRACT)

    # PolarPattern: Pocket ×3 about axis
    polarpattern_axis = Axis((0, 0, 19), (0, 0, 1))
    for i in range(1, POLARPATTERN_COUNT):
        add(pocket.rotate(polarpattern_axis, i * 360 / POLARPATTERN_COUNT), mode=Mode.SUBTRACT)

    # Sketch003 (on Face14 of PolarPattern) → Pocket001 (cut)
    with BuildSketch(Plane(origin=(0, 0, -6), x_dir=(1, 0, 0), z_dir=(0, 0, -1))):
        Polygon((-70.5, 122.109582), (141, 0), (-70.5, -122.109582), align=None)
        Polygon((-59.5, -103.057023), (-59.5, 103.057023), (119, 0), align=None, mode=Mode.SUBTRACT)
    extrude(amount=-POCKET001_DEPTH, mode=Mode.SUBTRACT)

    # Sketch002 (on Face39 of PolarPattern) → Pocket002 (cut, through all)
    with BuildSketch(Plane.XY.offset(19)):
        with Locations((-50.25, 0)):
            Circle(SKETCH002_R)
        with Locations((-50.25, 87.035553)):
            Circle(SKETCH002_R)
    pocket002 = extrude(amount=-POCKET002_DEPTH, mode=Mode.SUBTRACT)

    # PolarPattern001: Pocket002 ×3 about axis
    polarpattern001_axis = Axis((0, 0, 19), (0, 0, 1))
    for i in range(1, POLARPATTERN001_COUNT):
        add(pocket002.rotate(polarpattern001_axis, i * 360 / POLARPATTERN001_COUNT), mode=Mode.SUBTRACT)

    # Sketch004 (on Face40 of PolarPattern001) → Pocket003 (cut, through all)
    with BuildSketch(Plane.XY.offset(19)):
        with Locations((84.411543, 9)):
            Circle(SKETCH004_R)
        with Locations((84.411543, -9)):
            Circle(SKETCH004_R)
    pocket003 = extrude(amount=-POCKET003_DEPTH, mode=Mode.SUBTRACT)

    # PolarPattern002: Pocket003 ×3 about axis
    polarpattern002_axis = Axis((0, 0, 19), (0, 0, 1))
    for i in range(1, POLARPATTERN002_COUNT):
        add(pocket003.rotate(polarpattern002_axis, i * 360 / POLARPATTERN002_COUNT), mode=Mode.SUBTRACT)

    # PolarPattern003: Pocket002 ×3 about axis
    polarpattern003_axis = Axis((0, 0, 19), (0, 0, 1))
    for i in range(1, POLARPATTERN003_COUNT):
        add(pocket002.rotate(polarpattern003_axis, i * 360 / POLARPATTERN003_COUNT), mode=Mode.SUBTRACT)

    # Sketch005 (on Face1 of PolarPattern003) → Pocket004 (cut, through all)
    with BuildSketch(Plane.XY.offset(19)):
        with Locations((-79.25, 0)):
            Circle(SKETCH005_R)
    pocket004 = extrude(amount=-POCKET004_DEPTH, mode=Mode.SUBTRACT)

    # PolarPattern004: Pocket004 ×3 about axis
    polarpattern004_axis = Axis((0, 0, 19), (0, 0, 1))
    for i in range(1, POLARPATTERN004_COUNT):
        add(pocket004.rotate(polarpattern004_axis, i * 360 / POLARPATTERN004_COUNT), mode=Mode.SUBTRACT)

    # Sketch006 (on Face42 of PolarPattern004) → Pocket005 (cut, through all)
    with BuildSketch(Plane(origin=(0, 0, -3), x_dir=(1, 0, 0), z_dir=(0, 0, -1))):
        with BuildLine():
            ThreePointArc((123, 1.5), (121.5, 0), (123, -1.5))
            Line((123, -1.5), (135, -1.5))
            ThreePointArc((135, -1.5), (136.5, 0), (135, 1.5))
            Line((123, 1.5), (135, 1.5))
        make_face()
    extrude(amount=-POCKET005_DEPTH, mode=Mode.SUBTRACT)


solid = Compound([box005.part, body.part])
